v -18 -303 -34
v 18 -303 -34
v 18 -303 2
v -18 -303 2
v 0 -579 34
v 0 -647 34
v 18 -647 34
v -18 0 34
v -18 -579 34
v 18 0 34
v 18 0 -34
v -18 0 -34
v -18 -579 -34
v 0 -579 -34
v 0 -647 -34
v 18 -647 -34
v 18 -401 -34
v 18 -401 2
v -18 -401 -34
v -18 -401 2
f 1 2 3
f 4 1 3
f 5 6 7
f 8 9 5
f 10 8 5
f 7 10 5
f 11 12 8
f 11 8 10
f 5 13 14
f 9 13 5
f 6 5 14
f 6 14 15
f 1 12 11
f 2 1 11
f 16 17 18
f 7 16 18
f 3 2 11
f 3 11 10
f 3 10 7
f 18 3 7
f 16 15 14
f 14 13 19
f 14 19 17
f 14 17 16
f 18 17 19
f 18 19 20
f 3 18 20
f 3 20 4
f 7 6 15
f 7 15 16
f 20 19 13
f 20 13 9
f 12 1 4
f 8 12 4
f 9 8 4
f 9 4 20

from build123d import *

# Parameters (mm, degrees)
F0_W     = 36
F0_H     = 68
F1_DEPTH = 647
F2_W     = 98
F2_H     = 36
F3_DEPTH = 36
F5_W     = 68
F5_H     = 68
F6_DEPTH = 18


with BuildPart() as f1:
    # F0 (on Front) → F1 (new body)
    with BuildSketch(Plane.XZ):
        Rectangle(F0_W, F0_H)
    extrude(amount=F1_DEPTH)

    # F2 (on face) → F3 (cut, through all)
    with BuildSketch(Plane.YZ.offset(18)):
        with Locations((-352, -16)):
            Rectangle(F2_W, F2_H)
    extrude(amount=-F3_DEPTH, mode=Mode.SUBTRACT)

    # F5 (on face) → F6 (cut)
    with BuildSketch(Plane(origin=(-18, 0, 0), x_dir=(0, -1, 0), z_dir=(-1, 0, 0))):
        with Locations((613, 0)):
            Rectangle(F5_W, F5_H)
    extrude(amount=-F6_DEPTH, mode=Mode.SUBTRACT)


solid = f1.part
